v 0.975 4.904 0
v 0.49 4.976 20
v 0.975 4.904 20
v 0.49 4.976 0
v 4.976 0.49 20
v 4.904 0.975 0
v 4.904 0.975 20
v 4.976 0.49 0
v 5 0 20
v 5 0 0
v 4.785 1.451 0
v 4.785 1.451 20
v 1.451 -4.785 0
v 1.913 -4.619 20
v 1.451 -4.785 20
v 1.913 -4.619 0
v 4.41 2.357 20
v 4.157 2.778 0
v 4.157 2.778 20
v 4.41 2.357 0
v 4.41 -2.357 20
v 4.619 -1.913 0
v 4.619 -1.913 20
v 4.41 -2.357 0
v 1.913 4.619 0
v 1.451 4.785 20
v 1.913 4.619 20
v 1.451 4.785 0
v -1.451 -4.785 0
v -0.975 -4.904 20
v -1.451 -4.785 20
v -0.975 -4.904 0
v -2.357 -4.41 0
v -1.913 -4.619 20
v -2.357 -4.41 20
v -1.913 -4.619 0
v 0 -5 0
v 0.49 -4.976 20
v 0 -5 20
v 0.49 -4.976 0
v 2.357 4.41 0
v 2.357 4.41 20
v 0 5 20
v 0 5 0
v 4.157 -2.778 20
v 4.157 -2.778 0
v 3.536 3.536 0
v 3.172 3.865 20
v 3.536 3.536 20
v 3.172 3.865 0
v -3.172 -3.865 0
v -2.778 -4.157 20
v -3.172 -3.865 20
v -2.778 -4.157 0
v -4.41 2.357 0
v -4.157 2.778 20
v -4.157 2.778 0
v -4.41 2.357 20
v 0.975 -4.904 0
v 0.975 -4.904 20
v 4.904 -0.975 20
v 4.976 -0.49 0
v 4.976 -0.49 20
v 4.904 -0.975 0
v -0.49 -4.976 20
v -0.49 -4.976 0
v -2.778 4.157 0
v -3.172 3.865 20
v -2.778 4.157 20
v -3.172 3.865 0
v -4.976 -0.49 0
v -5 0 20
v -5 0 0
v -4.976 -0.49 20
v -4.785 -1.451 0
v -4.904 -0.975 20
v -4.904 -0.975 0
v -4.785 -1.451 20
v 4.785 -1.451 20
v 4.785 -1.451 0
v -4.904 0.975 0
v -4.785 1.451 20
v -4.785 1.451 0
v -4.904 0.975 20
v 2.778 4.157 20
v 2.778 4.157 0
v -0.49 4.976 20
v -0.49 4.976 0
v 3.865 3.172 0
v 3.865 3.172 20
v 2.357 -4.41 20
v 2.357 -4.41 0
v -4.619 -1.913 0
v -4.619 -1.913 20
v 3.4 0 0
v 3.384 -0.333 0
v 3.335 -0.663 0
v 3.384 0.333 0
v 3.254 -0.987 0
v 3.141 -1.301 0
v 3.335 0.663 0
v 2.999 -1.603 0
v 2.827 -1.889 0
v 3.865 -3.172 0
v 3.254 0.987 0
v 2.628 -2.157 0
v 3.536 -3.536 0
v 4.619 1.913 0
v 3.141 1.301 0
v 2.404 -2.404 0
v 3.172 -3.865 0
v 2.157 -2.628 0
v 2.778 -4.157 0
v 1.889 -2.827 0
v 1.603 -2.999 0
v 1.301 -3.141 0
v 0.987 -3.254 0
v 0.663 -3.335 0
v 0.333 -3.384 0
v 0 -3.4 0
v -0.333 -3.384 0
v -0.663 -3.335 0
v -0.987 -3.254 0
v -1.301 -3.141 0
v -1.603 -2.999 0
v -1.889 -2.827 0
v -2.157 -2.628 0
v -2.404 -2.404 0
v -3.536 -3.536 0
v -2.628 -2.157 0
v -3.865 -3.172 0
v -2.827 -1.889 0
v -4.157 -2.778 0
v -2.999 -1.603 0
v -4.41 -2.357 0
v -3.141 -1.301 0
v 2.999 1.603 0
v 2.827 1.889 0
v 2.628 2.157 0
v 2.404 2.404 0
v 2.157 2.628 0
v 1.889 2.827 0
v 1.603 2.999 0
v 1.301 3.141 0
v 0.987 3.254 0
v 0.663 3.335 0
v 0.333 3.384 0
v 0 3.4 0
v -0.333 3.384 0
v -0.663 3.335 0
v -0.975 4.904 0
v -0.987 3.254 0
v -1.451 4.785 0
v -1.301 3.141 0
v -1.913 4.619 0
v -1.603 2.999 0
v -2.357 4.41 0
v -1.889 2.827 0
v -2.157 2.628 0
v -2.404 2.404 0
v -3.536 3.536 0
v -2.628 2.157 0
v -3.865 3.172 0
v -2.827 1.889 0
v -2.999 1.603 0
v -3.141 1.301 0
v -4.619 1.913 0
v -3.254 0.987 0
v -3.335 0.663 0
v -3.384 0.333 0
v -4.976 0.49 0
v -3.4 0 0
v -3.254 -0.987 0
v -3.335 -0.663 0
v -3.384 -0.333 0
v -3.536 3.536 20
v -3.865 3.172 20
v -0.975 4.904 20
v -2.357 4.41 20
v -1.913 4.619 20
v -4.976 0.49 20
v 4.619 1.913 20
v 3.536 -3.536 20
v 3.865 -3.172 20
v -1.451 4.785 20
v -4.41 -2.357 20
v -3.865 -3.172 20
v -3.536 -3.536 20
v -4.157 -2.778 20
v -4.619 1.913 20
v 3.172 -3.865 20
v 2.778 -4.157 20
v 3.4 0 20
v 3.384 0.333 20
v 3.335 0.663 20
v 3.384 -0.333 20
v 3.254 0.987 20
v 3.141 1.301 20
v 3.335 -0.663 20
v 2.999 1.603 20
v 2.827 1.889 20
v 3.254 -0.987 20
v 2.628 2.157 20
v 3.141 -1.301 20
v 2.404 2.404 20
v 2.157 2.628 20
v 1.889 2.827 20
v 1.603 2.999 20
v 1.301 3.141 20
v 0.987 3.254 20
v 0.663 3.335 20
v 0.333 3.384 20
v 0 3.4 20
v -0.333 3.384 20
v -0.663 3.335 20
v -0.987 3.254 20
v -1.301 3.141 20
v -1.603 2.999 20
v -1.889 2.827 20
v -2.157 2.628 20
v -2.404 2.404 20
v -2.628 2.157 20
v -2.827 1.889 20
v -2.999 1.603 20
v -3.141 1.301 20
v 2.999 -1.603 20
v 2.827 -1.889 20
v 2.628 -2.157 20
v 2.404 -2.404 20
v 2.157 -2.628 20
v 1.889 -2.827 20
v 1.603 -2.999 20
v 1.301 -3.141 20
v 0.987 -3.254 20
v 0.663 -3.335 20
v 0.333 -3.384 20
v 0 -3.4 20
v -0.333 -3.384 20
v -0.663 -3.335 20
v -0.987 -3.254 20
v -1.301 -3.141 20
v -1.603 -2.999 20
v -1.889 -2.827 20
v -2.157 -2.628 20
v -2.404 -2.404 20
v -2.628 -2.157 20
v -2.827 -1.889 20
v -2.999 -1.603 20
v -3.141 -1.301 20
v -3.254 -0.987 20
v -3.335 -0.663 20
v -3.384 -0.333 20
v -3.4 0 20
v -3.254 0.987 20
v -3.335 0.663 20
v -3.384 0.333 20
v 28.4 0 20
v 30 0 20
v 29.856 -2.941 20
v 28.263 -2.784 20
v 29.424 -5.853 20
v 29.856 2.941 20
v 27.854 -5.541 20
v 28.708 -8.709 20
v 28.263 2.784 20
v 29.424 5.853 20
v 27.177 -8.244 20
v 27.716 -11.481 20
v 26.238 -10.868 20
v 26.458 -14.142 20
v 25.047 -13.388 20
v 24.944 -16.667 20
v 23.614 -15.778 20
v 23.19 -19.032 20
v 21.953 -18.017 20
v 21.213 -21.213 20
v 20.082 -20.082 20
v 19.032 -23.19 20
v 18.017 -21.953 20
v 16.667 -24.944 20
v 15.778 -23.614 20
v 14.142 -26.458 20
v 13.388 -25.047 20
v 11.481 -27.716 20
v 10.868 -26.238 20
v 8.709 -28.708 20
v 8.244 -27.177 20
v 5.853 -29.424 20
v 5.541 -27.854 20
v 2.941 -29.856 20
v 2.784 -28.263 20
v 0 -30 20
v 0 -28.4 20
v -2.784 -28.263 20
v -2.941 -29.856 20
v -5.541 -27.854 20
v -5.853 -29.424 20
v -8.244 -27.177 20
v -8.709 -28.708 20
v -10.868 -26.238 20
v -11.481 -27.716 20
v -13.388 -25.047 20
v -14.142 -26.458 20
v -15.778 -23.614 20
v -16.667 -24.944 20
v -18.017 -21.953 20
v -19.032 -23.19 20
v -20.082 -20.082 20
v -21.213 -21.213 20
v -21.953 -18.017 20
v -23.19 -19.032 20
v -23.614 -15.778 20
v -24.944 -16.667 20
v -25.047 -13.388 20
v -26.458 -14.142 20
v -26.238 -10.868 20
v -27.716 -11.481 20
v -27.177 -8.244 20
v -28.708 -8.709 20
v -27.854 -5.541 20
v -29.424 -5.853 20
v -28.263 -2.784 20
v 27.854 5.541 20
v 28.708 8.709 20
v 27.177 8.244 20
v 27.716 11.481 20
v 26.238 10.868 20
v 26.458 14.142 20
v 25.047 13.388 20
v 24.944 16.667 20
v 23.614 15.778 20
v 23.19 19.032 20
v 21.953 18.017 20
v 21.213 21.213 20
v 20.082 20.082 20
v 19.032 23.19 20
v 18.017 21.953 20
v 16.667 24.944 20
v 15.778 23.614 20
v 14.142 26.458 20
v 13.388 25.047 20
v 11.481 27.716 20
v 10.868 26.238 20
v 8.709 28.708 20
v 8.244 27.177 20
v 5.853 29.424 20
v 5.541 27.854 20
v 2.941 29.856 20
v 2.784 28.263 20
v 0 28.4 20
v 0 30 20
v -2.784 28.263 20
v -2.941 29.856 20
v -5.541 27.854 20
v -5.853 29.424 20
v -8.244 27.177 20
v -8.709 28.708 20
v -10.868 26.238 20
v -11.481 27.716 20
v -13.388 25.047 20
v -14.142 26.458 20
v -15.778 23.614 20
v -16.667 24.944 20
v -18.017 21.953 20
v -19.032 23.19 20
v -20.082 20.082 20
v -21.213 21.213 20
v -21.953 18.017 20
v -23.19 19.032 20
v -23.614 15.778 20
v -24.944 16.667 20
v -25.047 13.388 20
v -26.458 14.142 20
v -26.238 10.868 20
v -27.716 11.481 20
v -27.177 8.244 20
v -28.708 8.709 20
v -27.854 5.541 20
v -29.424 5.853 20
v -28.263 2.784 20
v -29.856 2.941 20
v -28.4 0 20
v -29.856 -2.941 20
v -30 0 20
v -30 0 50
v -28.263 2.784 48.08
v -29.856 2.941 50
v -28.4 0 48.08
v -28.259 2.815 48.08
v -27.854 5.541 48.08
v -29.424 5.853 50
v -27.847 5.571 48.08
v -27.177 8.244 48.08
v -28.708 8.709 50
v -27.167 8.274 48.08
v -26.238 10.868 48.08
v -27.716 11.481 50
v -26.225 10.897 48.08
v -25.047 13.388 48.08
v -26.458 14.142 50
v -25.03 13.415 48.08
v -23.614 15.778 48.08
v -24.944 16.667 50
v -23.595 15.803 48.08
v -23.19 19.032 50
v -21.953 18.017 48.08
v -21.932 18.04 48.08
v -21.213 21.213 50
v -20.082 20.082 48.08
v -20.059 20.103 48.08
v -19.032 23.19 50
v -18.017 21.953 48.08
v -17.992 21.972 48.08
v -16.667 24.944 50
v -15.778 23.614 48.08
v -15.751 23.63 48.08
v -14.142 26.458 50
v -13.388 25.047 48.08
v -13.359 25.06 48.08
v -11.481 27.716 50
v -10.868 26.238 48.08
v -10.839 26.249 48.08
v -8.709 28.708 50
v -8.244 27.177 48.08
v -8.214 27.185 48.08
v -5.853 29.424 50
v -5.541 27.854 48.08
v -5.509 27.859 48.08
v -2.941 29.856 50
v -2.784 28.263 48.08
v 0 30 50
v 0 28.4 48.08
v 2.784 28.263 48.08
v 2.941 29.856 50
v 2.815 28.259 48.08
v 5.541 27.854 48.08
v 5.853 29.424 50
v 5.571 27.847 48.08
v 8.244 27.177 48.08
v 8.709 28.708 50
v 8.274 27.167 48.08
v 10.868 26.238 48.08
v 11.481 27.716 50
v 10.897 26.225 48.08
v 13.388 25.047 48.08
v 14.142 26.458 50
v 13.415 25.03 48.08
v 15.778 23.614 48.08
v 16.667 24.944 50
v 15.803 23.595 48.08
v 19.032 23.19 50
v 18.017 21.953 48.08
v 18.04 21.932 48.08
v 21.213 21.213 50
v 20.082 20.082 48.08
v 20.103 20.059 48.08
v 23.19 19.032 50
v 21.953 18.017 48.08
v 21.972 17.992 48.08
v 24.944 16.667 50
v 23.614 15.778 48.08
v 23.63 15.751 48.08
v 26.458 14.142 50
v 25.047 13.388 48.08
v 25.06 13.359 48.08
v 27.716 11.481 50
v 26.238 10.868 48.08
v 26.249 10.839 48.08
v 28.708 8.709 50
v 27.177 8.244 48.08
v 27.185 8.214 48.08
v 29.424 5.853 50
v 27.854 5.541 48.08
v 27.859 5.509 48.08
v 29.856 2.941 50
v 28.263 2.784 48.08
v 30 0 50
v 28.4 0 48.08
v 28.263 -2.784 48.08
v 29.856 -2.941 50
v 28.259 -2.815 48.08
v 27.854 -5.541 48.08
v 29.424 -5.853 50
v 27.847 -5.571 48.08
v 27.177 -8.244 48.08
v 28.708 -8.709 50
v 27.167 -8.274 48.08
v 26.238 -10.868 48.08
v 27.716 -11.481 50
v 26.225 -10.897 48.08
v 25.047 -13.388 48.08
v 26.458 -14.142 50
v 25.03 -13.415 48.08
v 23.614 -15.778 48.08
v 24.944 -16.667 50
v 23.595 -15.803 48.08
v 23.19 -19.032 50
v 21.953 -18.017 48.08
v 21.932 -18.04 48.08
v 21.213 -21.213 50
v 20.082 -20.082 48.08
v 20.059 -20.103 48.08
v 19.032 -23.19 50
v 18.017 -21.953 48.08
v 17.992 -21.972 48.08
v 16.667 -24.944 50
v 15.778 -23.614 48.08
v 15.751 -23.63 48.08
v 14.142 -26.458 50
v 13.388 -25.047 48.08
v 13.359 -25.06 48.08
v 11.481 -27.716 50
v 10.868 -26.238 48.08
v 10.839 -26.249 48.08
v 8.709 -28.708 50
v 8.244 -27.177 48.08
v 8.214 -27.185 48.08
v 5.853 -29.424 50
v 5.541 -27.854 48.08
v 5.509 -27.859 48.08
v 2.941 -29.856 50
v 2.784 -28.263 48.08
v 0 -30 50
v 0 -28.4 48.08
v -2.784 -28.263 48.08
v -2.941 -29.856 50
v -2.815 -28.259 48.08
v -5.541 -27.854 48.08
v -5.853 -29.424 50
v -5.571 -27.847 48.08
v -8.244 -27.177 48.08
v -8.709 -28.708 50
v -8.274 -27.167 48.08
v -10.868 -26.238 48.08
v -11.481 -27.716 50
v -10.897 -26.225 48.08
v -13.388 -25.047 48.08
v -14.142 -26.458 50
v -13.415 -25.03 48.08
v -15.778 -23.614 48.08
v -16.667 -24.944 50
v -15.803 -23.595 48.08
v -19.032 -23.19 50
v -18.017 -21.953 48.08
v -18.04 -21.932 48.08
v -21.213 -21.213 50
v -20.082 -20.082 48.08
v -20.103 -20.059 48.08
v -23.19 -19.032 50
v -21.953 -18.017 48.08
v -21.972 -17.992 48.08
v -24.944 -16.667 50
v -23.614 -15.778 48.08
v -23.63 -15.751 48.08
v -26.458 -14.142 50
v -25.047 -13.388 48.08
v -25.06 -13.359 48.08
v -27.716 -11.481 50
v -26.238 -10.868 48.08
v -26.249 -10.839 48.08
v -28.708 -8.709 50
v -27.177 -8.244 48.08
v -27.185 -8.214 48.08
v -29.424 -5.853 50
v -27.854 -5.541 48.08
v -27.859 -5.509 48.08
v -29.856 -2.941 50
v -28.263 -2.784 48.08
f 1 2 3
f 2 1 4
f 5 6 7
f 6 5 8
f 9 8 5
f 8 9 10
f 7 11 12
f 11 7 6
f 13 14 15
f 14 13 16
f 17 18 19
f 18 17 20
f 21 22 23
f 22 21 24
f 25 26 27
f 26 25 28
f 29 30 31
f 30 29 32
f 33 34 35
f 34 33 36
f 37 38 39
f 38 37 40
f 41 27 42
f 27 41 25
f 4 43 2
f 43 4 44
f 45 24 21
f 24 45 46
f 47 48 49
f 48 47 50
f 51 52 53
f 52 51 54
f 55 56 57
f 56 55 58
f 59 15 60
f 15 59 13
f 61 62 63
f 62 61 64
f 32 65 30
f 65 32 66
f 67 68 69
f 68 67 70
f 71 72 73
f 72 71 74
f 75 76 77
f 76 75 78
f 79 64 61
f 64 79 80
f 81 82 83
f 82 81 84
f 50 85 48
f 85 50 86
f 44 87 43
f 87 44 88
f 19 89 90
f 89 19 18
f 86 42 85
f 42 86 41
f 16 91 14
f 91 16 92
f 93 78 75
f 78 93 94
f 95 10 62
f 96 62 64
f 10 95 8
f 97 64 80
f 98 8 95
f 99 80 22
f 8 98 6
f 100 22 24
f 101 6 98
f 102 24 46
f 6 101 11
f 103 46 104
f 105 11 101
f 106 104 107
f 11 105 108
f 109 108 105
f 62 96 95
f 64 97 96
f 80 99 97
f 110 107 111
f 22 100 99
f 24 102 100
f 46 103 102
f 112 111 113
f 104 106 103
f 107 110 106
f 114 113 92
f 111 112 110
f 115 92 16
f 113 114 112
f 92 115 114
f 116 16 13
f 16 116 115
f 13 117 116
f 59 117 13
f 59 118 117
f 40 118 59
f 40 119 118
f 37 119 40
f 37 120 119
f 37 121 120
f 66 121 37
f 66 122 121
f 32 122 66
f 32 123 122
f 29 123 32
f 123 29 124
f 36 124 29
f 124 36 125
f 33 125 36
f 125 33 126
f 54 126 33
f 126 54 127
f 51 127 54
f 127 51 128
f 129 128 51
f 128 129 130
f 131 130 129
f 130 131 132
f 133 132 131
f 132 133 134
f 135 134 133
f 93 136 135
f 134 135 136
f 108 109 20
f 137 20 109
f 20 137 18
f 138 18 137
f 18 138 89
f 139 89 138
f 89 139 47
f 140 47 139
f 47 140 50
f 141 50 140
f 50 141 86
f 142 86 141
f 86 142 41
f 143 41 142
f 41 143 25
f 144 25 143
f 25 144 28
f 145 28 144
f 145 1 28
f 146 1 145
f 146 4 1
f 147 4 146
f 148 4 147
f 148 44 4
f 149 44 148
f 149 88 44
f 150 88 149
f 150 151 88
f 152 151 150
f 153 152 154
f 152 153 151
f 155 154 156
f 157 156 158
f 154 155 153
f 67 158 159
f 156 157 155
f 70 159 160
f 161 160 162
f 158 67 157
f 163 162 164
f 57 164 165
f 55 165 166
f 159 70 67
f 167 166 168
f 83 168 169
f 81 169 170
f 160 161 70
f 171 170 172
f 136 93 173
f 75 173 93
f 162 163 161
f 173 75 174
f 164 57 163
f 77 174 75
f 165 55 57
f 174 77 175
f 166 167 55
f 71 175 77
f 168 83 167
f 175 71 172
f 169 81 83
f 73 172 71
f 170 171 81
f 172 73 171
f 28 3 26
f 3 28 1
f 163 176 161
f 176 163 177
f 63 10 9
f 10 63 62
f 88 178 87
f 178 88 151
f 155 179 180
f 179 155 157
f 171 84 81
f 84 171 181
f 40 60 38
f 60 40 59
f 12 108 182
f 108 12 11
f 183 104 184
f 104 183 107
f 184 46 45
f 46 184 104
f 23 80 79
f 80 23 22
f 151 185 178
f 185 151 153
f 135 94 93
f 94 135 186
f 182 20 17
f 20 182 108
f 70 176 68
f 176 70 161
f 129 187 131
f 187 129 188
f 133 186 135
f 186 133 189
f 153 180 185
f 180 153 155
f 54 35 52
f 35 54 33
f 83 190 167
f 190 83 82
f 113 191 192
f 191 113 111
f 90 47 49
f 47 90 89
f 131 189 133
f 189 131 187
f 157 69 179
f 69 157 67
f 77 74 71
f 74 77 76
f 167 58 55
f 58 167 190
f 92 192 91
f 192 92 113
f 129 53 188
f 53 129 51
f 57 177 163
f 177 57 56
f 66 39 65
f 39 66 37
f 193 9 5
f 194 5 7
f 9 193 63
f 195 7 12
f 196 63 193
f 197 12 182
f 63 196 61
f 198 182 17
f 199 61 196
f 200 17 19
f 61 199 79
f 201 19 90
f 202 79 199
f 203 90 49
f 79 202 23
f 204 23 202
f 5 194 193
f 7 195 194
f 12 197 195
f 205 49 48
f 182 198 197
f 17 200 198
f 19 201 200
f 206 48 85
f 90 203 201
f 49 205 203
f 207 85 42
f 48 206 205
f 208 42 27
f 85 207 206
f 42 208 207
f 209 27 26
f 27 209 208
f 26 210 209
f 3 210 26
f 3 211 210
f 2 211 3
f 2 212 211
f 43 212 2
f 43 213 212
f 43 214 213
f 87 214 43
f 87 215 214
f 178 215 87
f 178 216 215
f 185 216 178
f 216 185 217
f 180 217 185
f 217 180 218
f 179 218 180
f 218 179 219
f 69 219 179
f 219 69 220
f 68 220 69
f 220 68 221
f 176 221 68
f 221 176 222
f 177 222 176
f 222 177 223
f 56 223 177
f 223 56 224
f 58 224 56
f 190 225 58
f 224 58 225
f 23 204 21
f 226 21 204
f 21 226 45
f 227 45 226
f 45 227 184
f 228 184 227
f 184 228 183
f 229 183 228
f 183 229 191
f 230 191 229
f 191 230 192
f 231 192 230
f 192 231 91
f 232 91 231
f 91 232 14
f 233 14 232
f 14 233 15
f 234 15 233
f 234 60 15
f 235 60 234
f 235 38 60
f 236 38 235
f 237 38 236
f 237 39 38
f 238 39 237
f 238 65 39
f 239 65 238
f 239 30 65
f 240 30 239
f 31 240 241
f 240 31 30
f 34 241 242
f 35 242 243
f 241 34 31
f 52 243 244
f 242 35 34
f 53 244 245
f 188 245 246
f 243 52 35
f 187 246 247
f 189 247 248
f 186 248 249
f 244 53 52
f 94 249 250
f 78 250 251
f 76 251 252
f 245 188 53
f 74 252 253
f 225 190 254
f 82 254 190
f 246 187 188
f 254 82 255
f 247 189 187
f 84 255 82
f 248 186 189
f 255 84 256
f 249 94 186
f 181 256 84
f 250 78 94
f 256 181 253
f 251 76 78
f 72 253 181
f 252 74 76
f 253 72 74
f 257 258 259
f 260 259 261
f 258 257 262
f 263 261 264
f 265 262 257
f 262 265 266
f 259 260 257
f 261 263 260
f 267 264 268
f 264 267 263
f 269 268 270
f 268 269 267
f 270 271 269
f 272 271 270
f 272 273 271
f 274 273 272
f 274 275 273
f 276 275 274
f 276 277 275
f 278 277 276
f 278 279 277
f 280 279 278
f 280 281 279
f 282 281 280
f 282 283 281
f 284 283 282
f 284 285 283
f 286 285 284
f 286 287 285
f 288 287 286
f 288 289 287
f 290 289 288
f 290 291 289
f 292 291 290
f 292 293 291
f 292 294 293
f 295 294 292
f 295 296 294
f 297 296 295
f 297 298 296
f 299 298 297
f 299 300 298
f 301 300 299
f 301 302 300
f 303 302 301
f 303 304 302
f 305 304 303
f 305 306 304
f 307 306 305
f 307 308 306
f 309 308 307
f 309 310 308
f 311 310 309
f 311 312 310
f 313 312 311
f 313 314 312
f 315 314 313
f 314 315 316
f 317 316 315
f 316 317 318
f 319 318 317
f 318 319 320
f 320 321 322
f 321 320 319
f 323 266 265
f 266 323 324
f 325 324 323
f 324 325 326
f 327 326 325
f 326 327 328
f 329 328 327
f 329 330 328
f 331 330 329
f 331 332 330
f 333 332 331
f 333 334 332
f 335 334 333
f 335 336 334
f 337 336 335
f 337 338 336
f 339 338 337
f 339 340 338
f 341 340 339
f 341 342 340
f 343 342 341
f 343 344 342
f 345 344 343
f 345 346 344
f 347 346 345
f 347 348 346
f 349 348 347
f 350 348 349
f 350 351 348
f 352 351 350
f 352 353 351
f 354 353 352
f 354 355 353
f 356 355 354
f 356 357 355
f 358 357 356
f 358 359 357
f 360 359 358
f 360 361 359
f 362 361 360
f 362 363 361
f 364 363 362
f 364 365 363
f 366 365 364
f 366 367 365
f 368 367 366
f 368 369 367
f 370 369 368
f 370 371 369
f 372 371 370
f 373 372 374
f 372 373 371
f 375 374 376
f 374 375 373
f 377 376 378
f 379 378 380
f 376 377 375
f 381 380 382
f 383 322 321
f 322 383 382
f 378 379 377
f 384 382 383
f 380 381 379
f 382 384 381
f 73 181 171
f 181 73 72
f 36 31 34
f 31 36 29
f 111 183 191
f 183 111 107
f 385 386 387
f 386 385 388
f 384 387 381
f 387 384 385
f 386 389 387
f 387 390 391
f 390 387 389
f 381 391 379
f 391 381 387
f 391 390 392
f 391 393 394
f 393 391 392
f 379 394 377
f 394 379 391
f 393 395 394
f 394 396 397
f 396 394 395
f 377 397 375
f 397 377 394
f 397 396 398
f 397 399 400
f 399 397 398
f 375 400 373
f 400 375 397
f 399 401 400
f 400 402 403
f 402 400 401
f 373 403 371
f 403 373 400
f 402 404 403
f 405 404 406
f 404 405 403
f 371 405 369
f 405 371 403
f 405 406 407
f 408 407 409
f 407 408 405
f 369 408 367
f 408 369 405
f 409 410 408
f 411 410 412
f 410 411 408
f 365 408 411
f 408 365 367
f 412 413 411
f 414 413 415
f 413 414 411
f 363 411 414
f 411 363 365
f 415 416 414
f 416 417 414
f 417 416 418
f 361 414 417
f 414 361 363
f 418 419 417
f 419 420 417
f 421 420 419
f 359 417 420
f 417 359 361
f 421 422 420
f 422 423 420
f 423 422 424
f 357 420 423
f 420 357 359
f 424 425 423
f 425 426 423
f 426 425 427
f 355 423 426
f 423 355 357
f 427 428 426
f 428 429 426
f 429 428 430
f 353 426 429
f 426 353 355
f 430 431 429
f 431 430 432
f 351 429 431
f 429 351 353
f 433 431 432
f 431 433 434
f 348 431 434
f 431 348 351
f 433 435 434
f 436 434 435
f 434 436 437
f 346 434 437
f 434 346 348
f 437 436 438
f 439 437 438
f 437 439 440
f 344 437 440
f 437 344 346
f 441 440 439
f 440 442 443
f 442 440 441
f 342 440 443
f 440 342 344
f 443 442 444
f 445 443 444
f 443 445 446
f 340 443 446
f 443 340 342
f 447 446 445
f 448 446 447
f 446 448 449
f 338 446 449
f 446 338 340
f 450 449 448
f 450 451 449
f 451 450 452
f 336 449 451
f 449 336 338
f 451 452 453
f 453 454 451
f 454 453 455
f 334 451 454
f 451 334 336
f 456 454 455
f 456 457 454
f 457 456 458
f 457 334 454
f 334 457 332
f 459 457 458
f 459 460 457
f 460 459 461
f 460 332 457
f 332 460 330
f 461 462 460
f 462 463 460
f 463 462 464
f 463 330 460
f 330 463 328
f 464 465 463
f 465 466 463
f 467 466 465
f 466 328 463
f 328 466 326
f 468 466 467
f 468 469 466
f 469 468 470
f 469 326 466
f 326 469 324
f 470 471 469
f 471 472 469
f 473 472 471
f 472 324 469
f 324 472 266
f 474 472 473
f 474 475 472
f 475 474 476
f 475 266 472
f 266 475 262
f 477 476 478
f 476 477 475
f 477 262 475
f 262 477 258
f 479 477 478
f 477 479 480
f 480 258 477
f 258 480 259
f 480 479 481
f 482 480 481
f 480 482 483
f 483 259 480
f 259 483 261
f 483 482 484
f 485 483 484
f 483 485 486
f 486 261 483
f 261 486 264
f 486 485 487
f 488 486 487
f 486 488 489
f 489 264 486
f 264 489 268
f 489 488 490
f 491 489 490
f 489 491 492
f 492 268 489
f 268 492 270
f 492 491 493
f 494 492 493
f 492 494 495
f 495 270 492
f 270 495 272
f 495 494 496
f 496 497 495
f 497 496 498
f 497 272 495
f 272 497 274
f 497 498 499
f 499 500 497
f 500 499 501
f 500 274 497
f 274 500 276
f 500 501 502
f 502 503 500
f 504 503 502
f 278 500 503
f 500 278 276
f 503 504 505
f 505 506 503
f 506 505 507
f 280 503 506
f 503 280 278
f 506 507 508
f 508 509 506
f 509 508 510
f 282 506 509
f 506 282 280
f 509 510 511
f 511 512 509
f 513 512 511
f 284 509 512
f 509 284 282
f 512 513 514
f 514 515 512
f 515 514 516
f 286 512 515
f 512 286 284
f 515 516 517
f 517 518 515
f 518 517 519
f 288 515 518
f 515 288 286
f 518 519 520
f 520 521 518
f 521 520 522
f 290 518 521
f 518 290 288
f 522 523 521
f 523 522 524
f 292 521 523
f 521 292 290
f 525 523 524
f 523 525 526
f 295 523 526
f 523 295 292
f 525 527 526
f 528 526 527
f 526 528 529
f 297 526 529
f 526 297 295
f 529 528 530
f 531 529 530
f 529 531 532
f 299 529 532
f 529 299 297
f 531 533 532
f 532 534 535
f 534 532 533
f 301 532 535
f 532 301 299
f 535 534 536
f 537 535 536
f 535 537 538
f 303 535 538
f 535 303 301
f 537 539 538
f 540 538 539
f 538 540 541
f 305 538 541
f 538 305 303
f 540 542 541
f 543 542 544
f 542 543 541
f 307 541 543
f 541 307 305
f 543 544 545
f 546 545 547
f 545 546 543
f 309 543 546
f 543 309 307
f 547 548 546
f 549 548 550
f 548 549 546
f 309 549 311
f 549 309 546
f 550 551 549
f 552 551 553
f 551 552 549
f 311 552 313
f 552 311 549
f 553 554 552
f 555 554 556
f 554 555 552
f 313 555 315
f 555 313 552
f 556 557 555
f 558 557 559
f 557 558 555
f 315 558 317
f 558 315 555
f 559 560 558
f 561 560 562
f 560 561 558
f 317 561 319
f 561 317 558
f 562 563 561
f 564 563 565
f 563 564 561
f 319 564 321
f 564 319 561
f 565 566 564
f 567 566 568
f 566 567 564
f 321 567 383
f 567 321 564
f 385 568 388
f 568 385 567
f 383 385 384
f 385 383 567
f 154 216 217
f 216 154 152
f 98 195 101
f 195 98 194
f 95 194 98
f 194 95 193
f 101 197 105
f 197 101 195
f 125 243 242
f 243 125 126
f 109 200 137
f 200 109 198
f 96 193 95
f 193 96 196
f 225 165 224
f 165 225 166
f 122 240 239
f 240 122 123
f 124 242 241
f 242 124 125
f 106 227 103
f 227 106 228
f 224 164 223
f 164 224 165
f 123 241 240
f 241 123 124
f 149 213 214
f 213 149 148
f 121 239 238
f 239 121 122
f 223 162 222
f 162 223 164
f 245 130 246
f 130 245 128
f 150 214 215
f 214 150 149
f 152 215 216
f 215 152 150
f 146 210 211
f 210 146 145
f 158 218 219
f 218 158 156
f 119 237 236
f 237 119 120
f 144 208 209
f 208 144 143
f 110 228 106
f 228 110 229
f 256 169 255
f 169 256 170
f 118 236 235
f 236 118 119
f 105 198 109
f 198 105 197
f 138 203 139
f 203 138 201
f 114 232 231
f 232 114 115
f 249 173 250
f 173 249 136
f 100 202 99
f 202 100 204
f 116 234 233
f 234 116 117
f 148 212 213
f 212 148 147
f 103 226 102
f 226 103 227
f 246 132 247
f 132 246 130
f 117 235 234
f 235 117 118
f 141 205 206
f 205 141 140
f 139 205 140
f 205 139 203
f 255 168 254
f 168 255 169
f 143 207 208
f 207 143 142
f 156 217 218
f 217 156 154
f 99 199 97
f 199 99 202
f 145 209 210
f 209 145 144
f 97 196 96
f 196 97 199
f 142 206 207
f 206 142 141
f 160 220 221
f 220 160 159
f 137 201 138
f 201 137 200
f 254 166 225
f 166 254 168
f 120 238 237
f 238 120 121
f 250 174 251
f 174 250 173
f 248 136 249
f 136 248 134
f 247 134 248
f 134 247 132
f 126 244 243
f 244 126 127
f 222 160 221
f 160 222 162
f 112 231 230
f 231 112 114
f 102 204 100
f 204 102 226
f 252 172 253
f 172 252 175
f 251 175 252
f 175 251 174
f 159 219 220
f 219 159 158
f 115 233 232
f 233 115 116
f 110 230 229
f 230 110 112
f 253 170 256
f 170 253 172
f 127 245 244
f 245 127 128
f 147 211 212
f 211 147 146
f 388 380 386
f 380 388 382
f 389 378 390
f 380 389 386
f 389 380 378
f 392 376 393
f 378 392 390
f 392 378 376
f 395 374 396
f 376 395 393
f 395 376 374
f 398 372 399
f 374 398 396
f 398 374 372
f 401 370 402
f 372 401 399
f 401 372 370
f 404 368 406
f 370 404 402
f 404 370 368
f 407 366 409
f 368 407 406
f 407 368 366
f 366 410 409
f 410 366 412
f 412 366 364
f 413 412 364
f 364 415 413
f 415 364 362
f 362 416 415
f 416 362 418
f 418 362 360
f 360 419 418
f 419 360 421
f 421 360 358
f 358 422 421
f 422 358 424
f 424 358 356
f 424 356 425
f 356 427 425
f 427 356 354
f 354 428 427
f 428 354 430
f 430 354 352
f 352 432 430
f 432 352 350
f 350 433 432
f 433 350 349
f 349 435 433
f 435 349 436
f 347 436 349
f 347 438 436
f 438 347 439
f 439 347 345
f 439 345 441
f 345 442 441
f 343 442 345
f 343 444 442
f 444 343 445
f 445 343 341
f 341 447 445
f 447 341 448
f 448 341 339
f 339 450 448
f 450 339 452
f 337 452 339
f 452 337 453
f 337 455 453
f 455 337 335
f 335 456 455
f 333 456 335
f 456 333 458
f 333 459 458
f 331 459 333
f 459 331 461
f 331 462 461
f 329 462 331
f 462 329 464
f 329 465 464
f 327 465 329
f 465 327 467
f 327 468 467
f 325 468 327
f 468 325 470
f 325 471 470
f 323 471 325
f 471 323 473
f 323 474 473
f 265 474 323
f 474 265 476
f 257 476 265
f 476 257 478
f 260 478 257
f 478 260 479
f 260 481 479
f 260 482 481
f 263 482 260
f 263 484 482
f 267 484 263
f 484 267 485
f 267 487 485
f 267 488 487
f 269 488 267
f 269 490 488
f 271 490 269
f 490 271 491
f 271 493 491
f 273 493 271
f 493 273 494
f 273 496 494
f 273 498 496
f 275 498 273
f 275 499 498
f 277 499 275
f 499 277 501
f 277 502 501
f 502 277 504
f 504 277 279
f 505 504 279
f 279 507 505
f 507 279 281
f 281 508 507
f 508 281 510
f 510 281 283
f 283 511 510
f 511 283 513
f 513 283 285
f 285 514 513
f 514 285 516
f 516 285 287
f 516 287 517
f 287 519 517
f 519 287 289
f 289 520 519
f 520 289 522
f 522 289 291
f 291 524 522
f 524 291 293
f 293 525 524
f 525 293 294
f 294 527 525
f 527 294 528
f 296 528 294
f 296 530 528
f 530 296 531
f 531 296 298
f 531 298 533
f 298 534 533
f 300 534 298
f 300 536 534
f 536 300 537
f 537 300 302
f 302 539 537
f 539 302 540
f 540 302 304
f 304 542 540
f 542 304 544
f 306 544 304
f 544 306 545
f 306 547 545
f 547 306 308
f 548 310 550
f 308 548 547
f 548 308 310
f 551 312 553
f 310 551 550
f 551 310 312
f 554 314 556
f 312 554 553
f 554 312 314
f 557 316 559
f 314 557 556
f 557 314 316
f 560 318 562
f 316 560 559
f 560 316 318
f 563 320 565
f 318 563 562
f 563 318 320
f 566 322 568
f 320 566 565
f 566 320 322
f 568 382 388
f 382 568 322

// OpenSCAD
// Small lab funnel - straight spout with conical top, printed upright.
// Dimensions measured with calipers.

// Spout dimensions
spout_od = 10;
spout_id = 6.8;
spout_h  = 20;

// Cone dimensions
cone_bottom_od = 10;
cone_top_od    = 60;
cone_h         = 30; // from z=20 to z=50

// Wall thickness
wall = 1.6;

// Geometry helpers
$fn = 64;

// Calculate inner dimensions for the cone
cone_bottom_id = cone_bottom_od - 2 * wall;
cone_top_id    = cone_top_od - 2 * wall;

// Build the solid part
difference() {
    // 1. The outer shell (Union of Spout and Cone)
    union() {
        // Spout: Cylinder from z=0 to z=20
        translate([0, 0, 0]) 
            cylinder(h = spout_h, d = spout_od);
        
        // Cone: From z=20 to z=50
        // Constructed using rotate_extrude with a polygon profile
        // Profile points: [radius, height]
        // At z=20 (local 0), radius = cone_bottom_od/2 = 5
        // At z=50 (local 30), radius = cone_top_od/2 = 30
        translate([0, 0, 20]) 
            rotate_extrude($fn = 64) 
                polygon([
                    [cone_bottom_od/2, 0],
                    [cone_top_od/2, cone_h],
                    [cone_top_od/2, 0],
                    [cone_bottom_od/2, 0]
                ]);
    }
    
    // 2. The inner void (Difference to cut out the hole)
    // We need to cut out the spout bore and the cone bore.
    // Inner void: Vertical cylinder for spout, then tapered cone.
    
    union() {
        // Void Spout: Vertical cylinder from z=0 to z=20
        translate([0, 0, 0]) 
            cylinder(h = spout_h, d = spout_id);
        
        // Void Cone: From z=20 to z=50
        // Profile points: [radius, height]
        // At z=20 (local 0), radius = cone_bottom_id/2 = 3.4
        // At z=50 (local 30), radius = cone_top_id/2 = 26.7
        translate([0, 0, 20]) 
            rotate_extrude($fn = 64) 
                polygon([
                    [cone_bottom_id/2, 0],
                    [cone_top_id/2, cone_h],
                    [cone_top_id/2, 0],
                    [cone_bottom_id/2, 0]
                ]);
    }
}
